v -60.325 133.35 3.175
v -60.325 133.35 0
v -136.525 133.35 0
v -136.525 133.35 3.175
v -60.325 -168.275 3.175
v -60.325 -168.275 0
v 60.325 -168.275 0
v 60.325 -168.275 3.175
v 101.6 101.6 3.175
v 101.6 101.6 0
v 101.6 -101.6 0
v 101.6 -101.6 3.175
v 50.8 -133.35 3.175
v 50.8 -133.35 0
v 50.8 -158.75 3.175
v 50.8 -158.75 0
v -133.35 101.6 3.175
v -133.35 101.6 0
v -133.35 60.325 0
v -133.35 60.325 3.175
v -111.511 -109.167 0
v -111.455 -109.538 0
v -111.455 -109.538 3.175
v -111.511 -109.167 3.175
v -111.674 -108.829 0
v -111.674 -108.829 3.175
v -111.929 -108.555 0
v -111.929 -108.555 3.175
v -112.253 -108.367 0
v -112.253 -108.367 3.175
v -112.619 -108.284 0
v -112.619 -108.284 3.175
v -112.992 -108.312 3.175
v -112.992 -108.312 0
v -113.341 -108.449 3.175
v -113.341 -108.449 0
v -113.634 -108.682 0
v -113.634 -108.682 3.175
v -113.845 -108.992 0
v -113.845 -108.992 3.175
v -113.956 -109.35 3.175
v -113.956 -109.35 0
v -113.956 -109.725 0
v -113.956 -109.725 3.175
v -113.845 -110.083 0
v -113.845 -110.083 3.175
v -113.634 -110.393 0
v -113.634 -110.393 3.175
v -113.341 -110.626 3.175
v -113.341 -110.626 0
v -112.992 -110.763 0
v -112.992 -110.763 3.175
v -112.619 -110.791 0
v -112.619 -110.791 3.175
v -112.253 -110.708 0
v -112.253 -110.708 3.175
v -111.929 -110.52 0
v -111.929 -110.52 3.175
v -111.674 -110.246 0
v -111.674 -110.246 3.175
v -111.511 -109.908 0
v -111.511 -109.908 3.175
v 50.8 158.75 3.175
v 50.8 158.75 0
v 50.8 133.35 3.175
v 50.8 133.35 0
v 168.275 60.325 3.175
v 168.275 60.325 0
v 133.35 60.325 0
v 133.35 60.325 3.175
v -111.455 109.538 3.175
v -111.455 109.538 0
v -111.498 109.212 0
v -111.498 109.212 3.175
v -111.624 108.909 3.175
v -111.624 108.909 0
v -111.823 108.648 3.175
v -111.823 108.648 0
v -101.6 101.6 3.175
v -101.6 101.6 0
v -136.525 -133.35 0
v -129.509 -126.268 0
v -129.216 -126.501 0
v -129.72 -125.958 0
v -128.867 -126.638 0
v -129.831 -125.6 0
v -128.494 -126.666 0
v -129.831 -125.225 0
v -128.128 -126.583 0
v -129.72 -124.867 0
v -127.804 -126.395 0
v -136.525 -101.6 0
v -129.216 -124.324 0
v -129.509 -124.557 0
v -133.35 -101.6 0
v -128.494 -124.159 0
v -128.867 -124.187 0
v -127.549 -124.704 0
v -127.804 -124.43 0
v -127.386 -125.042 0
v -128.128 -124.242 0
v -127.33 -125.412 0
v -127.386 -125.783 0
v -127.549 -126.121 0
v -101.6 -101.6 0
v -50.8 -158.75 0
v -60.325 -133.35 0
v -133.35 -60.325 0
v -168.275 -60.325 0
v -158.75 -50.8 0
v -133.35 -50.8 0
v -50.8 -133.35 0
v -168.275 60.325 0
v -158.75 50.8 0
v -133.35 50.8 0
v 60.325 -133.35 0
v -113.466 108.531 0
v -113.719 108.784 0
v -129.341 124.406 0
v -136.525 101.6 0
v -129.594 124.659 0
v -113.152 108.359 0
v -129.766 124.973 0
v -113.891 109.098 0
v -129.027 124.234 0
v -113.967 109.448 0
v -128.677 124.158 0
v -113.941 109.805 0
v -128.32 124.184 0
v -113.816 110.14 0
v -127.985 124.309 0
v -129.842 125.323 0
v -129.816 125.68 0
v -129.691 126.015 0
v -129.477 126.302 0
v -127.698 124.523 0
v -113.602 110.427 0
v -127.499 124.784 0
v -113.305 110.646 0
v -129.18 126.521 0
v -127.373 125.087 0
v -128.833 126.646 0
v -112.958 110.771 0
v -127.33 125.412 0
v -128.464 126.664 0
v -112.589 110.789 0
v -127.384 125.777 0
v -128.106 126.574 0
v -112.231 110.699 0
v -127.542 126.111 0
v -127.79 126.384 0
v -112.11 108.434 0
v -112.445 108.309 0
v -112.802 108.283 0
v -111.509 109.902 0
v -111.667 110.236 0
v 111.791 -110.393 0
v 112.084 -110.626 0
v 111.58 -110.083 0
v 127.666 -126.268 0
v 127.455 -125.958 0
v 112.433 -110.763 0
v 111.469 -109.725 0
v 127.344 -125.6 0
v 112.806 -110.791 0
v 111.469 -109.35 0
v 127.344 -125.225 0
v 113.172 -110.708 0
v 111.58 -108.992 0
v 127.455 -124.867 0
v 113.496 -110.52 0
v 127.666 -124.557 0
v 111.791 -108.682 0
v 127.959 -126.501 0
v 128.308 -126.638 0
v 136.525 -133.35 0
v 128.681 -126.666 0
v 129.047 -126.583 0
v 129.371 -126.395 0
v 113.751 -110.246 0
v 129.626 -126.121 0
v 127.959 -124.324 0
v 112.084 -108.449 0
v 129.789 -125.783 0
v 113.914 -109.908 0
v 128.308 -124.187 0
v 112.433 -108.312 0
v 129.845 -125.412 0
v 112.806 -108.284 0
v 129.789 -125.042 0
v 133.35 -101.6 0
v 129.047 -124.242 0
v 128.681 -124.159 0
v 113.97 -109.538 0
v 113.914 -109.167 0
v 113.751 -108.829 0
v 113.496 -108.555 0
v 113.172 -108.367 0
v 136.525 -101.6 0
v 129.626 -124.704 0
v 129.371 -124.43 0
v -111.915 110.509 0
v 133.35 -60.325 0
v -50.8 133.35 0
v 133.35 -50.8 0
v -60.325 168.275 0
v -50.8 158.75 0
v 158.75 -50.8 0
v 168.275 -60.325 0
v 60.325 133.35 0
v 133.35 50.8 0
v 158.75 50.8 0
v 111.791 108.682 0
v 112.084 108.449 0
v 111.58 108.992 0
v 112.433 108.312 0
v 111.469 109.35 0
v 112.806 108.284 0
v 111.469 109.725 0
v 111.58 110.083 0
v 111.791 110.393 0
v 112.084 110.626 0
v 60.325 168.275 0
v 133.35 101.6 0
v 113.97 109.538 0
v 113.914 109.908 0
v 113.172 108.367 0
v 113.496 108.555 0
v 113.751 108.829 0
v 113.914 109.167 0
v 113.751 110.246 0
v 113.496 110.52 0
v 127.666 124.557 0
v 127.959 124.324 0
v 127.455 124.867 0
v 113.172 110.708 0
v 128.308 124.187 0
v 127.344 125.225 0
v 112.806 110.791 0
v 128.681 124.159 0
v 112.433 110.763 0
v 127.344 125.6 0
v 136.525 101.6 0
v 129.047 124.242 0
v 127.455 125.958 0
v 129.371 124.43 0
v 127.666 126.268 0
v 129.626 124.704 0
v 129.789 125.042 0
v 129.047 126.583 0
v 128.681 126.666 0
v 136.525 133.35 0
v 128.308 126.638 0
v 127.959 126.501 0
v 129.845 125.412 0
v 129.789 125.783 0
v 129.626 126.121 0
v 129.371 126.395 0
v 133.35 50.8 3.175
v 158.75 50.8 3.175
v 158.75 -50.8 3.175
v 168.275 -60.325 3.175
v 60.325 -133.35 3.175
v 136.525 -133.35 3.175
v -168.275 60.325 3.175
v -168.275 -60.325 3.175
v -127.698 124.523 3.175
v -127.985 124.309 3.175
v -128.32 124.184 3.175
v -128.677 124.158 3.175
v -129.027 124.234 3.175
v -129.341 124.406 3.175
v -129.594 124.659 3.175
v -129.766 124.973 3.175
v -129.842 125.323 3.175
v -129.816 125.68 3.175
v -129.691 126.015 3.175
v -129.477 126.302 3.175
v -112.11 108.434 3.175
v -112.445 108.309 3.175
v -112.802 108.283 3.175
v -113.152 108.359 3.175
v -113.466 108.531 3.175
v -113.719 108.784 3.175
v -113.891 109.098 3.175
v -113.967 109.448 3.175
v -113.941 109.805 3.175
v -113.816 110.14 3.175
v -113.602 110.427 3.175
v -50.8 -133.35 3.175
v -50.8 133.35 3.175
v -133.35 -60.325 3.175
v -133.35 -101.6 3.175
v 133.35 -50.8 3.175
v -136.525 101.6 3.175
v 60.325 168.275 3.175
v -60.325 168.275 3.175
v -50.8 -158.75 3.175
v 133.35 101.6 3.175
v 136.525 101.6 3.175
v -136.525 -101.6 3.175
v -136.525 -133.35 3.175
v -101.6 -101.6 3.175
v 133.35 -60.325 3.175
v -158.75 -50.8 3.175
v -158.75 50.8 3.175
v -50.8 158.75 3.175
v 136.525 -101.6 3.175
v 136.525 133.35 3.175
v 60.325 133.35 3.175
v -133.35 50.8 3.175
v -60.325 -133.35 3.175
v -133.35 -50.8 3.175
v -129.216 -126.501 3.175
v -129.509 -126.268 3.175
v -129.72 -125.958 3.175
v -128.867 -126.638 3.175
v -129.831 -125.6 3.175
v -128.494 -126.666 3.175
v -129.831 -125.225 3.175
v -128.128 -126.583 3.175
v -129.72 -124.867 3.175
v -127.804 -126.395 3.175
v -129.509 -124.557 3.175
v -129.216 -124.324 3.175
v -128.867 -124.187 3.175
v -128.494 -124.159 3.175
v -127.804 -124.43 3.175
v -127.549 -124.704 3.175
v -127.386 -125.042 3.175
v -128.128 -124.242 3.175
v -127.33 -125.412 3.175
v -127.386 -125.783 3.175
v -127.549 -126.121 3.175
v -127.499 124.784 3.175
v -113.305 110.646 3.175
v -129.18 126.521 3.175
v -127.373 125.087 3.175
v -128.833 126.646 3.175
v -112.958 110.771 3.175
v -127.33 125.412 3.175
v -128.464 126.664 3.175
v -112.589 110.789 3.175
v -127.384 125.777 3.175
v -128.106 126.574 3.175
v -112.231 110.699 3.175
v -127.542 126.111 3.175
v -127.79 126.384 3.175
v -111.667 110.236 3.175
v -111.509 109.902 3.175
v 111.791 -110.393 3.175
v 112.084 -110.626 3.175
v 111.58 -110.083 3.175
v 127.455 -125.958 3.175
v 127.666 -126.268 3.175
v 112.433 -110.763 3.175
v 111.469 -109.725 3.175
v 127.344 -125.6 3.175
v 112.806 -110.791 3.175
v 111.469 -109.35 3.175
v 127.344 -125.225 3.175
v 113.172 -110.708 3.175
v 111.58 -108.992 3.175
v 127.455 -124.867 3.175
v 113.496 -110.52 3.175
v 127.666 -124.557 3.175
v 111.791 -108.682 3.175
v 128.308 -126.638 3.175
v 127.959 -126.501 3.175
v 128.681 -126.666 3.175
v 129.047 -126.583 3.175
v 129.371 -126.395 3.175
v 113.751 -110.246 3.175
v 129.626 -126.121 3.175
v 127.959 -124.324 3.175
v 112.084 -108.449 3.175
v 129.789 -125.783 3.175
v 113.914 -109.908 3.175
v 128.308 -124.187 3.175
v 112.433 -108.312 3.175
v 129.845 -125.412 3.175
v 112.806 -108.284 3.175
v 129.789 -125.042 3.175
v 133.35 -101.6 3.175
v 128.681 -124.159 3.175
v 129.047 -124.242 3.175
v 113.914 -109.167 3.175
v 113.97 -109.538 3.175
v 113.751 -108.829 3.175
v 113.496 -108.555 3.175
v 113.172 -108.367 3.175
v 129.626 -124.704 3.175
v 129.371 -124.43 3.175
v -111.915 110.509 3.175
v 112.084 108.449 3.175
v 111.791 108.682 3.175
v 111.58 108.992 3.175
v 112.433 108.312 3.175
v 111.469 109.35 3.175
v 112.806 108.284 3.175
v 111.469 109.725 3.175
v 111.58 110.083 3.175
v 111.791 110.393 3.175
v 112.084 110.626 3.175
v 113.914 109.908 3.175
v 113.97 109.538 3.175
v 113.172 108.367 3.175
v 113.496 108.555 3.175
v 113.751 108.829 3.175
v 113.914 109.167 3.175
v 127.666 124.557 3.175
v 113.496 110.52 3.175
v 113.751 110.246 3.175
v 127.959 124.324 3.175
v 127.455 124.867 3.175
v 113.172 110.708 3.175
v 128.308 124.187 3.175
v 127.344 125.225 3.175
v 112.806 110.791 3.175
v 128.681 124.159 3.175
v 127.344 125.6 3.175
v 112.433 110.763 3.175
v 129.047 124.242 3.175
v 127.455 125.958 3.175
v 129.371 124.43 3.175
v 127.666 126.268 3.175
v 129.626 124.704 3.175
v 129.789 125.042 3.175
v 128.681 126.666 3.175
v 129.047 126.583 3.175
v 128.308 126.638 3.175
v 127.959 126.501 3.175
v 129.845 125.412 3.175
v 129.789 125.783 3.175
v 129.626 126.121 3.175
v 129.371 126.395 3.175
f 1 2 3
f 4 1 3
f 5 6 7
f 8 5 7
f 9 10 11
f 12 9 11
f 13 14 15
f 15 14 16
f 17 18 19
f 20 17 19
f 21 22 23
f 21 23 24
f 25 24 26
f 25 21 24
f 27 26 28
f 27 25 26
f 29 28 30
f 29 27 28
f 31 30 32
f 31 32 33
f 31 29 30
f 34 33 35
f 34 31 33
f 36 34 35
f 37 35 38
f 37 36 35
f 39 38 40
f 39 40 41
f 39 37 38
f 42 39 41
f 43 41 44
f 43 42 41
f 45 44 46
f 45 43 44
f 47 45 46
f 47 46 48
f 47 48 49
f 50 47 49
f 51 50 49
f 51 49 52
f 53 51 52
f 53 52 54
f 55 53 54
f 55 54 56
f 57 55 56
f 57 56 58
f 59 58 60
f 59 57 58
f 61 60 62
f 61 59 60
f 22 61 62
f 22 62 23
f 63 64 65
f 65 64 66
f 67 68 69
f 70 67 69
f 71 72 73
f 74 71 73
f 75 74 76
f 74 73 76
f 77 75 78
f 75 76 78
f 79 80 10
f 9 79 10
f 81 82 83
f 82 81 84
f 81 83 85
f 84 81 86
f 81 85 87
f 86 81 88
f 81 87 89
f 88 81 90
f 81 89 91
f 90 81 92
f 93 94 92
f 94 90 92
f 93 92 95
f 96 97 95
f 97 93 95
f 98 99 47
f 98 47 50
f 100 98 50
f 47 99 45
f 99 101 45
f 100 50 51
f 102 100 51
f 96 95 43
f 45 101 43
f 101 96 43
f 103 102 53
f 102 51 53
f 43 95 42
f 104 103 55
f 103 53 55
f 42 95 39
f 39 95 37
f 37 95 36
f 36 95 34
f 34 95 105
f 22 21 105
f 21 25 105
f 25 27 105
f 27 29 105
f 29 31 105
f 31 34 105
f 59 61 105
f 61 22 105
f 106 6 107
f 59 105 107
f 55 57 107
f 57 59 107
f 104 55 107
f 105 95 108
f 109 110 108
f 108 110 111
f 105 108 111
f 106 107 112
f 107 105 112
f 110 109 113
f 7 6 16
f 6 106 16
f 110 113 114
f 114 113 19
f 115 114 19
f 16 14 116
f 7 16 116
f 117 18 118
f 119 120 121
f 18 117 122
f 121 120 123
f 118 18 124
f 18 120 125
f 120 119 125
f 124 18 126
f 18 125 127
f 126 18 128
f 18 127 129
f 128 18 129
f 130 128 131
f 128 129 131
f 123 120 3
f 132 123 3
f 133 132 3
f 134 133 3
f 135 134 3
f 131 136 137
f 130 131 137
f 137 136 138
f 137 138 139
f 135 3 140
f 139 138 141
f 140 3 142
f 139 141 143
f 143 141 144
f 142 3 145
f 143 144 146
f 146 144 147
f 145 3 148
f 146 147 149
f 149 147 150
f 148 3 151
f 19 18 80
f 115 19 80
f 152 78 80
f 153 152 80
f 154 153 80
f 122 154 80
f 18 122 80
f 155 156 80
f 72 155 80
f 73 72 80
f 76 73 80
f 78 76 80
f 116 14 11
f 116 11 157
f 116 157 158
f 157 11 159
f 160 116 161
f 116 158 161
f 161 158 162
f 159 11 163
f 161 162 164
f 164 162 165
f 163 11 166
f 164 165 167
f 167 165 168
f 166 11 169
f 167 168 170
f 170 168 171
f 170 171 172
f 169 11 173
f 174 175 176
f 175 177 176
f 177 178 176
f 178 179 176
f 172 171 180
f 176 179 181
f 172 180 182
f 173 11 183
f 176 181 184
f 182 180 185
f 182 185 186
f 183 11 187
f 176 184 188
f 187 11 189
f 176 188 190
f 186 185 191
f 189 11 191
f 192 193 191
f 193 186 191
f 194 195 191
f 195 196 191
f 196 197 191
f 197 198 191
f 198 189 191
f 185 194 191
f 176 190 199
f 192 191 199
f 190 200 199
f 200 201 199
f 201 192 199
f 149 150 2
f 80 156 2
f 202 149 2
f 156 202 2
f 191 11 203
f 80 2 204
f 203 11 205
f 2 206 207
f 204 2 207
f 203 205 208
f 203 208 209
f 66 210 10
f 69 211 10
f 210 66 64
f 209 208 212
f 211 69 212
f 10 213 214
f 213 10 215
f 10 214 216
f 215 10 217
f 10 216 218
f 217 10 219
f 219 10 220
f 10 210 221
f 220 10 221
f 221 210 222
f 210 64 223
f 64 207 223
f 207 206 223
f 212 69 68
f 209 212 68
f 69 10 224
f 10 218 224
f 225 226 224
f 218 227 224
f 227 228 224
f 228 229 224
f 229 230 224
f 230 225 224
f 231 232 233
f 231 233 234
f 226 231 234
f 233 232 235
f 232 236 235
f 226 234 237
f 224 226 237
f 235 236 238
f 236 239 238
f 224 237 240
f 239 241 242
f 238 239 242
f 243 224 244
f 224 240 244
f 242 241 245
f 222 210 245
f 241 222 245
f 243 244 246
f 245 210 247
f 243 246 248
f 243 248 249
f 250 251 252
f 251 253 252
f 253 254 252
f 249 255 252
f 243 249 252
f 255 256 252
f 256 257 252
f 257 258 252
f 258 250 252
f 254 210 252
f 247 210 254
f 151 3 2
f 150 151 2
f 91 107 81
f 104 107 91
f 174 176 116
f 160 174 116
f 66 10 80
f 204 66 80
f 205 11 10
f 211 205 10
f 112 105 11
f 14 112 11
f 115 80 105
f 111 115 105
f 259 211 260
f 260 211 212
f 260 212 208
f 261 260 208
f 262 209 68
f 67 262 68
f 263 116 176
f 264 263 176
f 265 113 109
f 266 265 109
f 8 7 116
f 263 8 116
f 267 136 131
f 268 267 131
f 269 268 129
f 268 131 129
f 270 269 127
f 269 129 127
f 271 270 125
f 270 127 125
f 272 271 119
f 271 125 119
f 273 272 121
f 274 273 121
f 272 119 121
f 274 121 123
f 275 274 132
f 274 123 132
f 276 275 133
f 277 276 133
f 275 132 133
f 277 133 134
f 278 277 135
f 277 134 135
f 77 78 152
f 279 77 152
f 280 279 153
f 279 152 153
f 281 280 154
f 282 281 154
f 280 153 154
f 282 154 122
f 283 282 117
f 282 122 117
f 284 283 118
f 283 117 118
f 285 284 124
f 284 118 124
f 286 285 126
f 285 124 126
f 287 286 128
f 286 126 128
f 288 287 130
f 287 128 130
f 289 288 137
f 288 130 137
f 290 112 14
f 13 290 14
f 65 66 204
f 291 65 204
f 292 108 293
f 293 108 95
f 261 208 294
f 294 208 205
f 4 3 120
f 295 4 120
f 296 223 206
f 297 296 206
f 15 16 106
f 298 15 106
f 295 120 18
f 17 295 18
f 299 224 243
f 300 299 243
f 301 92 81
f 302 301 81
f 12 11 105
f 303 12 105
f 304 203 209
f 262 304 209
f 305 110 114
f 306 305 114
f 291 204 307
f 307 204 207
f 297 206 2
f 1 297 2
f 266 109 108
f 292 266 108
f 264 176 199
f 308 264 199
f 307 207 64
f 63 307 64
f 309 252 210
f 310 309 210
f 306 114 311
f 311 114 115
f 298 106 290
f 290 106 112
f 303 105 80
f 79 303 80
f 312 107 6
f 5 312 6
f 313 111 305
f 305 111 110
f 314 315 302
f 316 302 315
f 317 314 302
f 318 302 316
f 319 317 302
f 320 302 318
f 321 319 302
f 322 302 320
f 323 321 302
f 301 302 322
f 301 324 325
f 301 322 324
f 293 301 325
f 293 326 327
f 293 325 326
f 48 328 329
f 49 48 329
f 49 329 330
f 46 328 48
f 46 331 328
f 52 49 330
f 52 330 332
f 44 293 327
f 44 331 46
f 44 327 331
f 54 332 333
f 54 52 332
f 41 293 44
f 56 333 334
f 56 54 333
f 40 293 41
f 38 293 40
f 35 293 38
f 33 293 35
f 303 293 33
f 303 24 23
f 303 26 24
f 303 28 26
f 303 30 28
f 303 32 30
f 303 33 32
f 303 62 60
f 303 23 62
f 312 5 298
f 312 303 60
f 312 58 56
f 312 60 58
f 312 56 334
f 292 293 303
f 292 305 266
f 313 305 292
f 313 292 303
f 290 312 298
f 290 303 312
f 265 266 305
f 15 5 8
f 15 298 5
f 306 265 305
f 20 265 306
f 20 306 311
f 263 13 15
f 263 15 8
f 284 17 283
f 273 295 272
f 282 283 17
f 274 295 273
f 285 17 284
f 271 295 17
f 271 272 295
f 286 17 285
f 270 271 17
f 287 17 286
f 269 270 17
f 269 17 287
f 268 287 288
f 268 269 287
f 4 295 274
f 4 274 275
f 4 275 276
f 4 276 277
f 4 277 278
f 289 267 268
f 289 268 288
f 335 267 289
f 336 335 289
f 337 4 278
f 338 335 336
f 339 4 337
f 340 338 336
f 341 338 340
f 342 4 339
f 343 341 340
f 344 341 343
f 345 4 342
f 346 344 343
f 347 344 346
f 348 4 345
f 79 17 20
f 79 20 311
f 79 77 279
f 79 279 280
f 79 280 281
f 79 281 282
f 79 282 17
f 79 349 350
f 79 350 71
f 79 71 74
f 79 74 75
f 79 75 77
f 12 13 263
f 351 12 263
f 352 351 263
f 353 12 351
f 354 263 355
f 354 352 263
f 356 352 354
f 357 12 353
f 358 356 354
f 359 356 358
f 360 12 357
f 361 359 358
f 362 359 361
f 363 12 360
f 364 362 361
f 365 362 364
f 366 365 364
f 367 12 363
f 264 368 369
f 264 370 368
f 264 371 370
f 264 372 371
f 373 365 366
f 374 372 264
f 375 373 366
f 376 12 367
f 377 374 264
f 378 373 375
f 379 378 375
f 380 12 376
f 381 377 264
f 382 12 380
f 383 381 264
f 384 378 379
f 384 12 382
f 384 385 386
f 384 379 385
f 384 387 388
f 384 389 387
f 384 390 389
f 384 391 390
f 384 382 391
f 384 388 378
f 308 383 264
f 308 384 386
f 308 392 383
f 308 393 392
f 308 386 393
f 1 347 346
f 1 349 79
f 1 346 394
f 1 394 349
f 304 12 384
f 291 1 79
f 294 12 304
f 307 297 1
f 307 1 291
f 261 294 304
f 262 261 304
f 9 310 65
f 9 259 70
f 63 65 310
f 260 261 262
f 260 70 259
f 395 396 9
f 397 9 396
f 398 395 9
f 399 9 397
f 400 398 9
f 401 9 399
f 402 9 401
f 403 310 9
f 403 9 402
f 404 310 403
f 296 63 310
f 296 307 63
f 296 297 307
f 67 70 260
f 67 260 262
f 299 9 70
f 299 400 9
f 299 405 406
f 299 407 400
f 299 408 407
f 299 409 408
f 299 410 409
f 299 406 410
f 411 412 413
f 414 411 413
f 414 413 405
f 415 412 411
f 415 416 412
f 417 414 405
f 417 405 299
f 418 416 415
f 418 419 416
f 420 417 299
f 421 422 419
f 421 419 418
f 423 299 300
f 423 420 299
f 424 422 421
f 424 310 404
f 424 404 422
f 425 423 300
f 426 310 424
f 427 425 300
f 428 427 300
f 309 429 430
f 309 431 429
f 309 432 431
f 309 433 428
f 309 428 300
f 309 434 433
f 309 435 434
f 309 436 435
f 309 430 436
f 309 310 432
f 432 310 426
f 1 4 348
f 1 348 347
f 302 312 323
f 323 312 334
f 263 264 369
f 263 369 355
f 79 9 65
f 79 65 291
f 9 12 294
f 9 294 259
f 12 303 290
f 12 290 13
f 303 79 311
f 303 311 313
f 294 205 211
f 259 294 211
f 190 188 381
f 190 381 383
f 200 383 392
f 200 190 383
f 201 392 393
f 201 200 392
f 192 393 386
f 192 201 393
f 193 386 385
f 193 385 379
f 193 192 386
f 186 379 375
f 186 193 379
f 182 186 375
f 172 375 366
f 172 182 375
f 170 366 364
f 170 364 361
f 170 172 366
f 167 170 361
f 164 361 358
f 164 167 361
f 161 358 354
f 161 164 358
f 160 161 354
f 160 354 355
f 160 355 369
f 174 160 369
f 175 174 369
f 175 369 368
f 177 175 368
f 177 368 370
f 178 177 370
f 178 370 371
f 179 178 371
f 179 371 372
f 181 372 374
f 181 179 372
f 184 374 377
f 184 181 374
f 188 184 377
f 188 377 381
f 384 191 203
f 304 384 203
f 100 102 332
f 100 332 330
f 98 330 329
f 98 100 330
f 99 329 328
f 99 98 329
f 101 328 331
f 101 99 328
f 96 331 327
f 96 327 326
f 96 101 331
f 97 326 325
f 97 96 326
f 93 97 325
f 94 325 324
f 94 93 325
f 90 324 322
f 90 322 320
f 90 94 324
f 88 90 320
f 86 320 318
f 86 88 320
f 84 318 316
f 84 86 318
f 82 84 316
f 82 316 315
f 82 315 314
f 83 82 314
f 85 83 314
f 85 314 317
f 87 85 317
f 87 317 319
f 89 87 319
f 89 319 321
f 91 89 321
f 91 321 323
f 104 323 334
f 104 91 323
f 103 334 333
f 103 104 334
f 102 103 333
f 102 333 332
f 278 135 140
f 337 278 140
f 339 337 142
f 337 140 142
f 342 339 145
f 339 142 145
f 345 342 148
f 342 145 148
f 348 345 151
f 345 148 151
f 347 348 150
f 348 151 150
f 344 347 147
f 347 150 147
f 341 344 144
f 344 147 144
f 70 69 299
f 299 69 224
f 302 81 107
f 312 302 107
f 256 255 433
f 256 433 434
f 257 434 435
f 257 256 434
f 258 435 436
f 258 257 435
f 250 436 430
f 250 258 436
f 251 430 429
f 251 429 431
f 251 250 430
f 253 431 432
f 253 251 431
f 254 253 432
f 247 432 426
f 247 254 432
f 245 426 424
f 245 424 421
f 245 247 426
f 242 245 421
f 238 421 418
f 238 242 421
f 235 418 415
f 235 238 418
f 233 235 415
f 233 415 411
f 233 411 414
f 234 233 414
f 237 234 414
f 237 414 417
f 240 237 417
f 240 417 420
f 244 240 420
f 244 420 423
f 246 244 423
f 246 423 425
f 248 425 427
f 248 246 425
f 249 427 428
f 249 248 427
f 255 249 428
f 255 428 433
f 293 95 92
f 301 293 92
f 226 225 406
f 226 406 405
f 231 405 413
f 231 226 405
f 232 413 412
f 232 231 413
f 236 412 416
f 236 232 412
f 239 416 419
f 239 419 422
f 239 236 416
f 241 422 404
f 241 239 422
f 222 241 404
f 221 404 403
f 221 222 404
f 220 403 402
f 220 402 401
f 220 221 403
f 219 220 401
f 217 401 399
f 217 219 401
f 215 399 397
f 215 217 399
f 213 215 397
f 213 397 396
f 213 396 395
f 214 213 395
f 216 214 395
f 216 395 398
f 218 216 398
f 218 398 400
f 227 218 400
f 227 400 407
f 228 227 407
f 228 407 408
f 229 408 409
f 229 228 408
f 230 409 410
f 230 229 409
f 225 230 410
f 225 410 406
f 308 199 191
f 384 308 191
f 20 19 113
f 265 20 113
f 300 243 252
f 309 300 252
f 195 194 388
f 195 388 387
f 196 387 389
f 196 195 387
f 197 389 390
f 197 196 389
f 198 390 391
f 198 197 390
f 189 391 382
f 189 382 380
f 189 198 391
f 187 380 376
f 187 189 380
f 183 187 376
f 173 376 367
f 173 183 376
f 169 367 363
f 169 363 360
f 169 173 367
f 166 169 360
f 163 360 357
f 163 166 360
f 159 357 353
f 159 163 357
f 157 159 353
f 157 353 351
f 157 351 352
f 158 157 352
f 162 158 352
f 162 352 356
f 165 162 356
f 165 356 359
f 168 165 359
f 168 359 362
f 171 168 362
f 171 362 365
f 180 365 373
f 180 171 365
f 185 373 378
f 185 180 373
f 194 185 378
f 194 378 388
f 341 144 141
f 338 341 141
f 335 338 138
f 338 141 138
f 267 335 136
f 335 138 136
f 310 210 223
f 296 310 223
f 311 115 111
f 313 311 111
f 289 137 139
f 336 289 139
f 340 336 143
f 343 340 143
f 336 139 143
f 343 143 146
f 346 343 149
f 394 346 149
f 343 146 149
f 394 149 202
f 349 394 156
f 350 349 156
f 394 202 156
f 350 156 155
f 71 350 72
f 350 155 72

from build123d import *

# Parameters (mm, degrees)
F0_R     = 1.2573
F1_DEPTH = 3.175


with BuildPart() as f1:
    # F0 (on Top) → F1 (new body)
    with BuildSketch(Plane.XY):
        with BuildLine():
            Line((-104.775, 133.35), (-104.775, 101.6))
            Line((-104.775, 101.6), (-111.823455, 108.648455))
            ThreePointArc((-111.823455, 108.648455), (-113.601545, 108.648455), (-113.601545, 110.426545))
            Line((-113.601545, 110.426545), (-120.65, 117.475))
            Line((-120.65, 117.475), (-127.698455, 124.523455))
            ThreePointArc((-127.698455, 124.523455), (-129.476545, 124.523455), (-129.476545, 126.301545))
            Line((-129.476545, 126.301545), (-136.525, 133.35))
            Line((-136.525, 133.35), (-136.525, 101.6))
            Line((-136.525, 101.6), (-133.35, 101.6))
            Line((-133.35, 101.6), (-133.35, 60.325))
            Line((-133.35, 60.325), (-133.35, 50.8))
            Line((-133.35, 50.8), (-133.35, -50.8))
            Line((-133.35, -50.8), (-133.35, -60.325))
            Line((-133.35, -60.325), (-133.35, -101.6))
            Line((-133.35, -101.6), (-136.525, -101.6))
            Line((-136.525, -101.6), (-136.525, -133.35))
            Line((-136.525, -133.35), (-60.325, -133.35))
            Line((-60.325, -133.35), (-50.8, -133.35))
            Line((-50.8, -133.35), (50.8, -133.35))
            Line((50.8, -133.35), (60.325, -133.35))
            Line((60.325, -133.35), (136.525, -133.35))
            Line((136.525, -133.35), (136.525, -101.6))
            Line((136.525, -101.6), (133.35, -101.6))
            Line((133.35, -101.6), (133.35, -60.325))
            Line((133.35, -60.325), (133.35, -50.8))
            Line((133.35, -50.8), (133.35, 0))
            Line((133.35, 0), (133.35, 50.8))
            Line((133.35, 50.8), (133.35, 60.325))
            Line((133.35, 60.325), (133.35, 101.6))
            Line((133.35, 101.6), (136.525, 101.6))
            Line((136.525, 101.6), (136.525, 133.35))
            Line((136.525, 133.35), (104.775, 133.35))
            Line((104.775, 133.35), (101.6, 133.35))
            Line((101.6, 133.35), (60.325, 133.35))
            Line((60.325, 133.35), (50.8, 133.35))
            Line((50.8, 133.35), (0, 133.35))
            Line((0, 133.35), (-50.8, 133.35))
            Line((-50.8, 133.35), (-60.325, 133.35))
            Line((-60.325, 133.35), (-101.6, 133.35))
            Line((-101.6, 133.35), (-104.775, 133.35))
        make_face()
        with Locations((-128.5875, -125.4125)):
            Circle(F0_R, mode=Mode.SUBTRACT)
        with Locations((-112.7125, -109.5375)):
            Circle(F0_R, mode=Mode.SUBTRACT)
        with Locations((112.7125, -109.5375)):
            Circle(F0_R, mode=Mode.SUBTRACT)
        with Locations((128.5875, -125.4125)):
            Circle(F0_R, mode=Mode.SUBTRACT)
        Polygon((0, 101.6), (101.6, 101.6), (101.6, 0), (101.6, -101.6), (0, -101.6), (-101.6, -101.6), (-101.6, 0), (-101.6, 101.6), align=None, mode=Mode.SUBTRACT)
        with Locations((112.7125, 109.5375)):
            Circle(F0_R, mode=Mode.SUBTRACT)
        with Locations((128.5875, 125.4125)):
            Circle(F0_R, mode=Mode.SUBTRACT)
        with BuildLine():
            Line((-111.823455, 108.648455), (-104.775, 101.6))
            Line((-104.775, 101.6), (-104.775, 133.35))
            Line((-104.775, 133.35), (-136.525, 133.35))
            Line((-136.525, 133.35), (-129.476545, 126.301545))
            ThreePointArc((-129.476545, 126.301545), (-128.106352, 126.574094), (-127.3302, 125.4125))
            ThreePointArc((-127.3302, 125.4125), (-127.425906, 124.931352), (-127.698455, 124.523455))
            Line((-127.698455, 124.523455), (-120.65, 117.475))
            Line((-120.65, 117.475), (-113.601545, 110.426545))
            ThreePointArc((-113.601545, 110.426545), (-112.231352, 110.699094), (-111.4552, 109.5375))
            ThreePointArc((-111.4552, 109.5375), (-111.550906, 109.056352), (-111.823455, 108.648455))
        make_face()
        Polygon((-60.325, 168.275), (-60.325, 133.35), (-50.8, 133.35), (-50.8, 158.75), (0, 158.75), (50.8, 158.75), (50.8, 133.35), (60.325, 133.35), (60.325, 168.275), (0, 168.275), align=None)
        Polygon((-133.35, 50.8), (-133.35, 60.325), (-168.275, 60.325), (-168.275, 0), (-168.275, -60.325), (-133.35, -60.325), (-133.35, -50.8), (-158.75, -50.8), (-158.75, 0), (-158.75, 50.8), align=None)
        Polygon((-50.8, -133.35), (-60.325, -133.35), (-60.325, -168.275), (0, -168.275), (60.325, -168.275), (60.325, -133.35), (50.8, -133.35), (50.8, -158.75), (0, -158.75), (-50.8, -158.75), align=None)
        Polygon((168.275, 60.325), (133.35, 60.325), (133.35, 50.8), (158.75, 50.8), (158.75, 0), (158.75, -50.8), (133.35, -50.8), (133.35, -60.325), (168.275, -60.325), (168.275, 0), align=None)
    extrude(amount=F1_DEPTH)


solid = f1.part
